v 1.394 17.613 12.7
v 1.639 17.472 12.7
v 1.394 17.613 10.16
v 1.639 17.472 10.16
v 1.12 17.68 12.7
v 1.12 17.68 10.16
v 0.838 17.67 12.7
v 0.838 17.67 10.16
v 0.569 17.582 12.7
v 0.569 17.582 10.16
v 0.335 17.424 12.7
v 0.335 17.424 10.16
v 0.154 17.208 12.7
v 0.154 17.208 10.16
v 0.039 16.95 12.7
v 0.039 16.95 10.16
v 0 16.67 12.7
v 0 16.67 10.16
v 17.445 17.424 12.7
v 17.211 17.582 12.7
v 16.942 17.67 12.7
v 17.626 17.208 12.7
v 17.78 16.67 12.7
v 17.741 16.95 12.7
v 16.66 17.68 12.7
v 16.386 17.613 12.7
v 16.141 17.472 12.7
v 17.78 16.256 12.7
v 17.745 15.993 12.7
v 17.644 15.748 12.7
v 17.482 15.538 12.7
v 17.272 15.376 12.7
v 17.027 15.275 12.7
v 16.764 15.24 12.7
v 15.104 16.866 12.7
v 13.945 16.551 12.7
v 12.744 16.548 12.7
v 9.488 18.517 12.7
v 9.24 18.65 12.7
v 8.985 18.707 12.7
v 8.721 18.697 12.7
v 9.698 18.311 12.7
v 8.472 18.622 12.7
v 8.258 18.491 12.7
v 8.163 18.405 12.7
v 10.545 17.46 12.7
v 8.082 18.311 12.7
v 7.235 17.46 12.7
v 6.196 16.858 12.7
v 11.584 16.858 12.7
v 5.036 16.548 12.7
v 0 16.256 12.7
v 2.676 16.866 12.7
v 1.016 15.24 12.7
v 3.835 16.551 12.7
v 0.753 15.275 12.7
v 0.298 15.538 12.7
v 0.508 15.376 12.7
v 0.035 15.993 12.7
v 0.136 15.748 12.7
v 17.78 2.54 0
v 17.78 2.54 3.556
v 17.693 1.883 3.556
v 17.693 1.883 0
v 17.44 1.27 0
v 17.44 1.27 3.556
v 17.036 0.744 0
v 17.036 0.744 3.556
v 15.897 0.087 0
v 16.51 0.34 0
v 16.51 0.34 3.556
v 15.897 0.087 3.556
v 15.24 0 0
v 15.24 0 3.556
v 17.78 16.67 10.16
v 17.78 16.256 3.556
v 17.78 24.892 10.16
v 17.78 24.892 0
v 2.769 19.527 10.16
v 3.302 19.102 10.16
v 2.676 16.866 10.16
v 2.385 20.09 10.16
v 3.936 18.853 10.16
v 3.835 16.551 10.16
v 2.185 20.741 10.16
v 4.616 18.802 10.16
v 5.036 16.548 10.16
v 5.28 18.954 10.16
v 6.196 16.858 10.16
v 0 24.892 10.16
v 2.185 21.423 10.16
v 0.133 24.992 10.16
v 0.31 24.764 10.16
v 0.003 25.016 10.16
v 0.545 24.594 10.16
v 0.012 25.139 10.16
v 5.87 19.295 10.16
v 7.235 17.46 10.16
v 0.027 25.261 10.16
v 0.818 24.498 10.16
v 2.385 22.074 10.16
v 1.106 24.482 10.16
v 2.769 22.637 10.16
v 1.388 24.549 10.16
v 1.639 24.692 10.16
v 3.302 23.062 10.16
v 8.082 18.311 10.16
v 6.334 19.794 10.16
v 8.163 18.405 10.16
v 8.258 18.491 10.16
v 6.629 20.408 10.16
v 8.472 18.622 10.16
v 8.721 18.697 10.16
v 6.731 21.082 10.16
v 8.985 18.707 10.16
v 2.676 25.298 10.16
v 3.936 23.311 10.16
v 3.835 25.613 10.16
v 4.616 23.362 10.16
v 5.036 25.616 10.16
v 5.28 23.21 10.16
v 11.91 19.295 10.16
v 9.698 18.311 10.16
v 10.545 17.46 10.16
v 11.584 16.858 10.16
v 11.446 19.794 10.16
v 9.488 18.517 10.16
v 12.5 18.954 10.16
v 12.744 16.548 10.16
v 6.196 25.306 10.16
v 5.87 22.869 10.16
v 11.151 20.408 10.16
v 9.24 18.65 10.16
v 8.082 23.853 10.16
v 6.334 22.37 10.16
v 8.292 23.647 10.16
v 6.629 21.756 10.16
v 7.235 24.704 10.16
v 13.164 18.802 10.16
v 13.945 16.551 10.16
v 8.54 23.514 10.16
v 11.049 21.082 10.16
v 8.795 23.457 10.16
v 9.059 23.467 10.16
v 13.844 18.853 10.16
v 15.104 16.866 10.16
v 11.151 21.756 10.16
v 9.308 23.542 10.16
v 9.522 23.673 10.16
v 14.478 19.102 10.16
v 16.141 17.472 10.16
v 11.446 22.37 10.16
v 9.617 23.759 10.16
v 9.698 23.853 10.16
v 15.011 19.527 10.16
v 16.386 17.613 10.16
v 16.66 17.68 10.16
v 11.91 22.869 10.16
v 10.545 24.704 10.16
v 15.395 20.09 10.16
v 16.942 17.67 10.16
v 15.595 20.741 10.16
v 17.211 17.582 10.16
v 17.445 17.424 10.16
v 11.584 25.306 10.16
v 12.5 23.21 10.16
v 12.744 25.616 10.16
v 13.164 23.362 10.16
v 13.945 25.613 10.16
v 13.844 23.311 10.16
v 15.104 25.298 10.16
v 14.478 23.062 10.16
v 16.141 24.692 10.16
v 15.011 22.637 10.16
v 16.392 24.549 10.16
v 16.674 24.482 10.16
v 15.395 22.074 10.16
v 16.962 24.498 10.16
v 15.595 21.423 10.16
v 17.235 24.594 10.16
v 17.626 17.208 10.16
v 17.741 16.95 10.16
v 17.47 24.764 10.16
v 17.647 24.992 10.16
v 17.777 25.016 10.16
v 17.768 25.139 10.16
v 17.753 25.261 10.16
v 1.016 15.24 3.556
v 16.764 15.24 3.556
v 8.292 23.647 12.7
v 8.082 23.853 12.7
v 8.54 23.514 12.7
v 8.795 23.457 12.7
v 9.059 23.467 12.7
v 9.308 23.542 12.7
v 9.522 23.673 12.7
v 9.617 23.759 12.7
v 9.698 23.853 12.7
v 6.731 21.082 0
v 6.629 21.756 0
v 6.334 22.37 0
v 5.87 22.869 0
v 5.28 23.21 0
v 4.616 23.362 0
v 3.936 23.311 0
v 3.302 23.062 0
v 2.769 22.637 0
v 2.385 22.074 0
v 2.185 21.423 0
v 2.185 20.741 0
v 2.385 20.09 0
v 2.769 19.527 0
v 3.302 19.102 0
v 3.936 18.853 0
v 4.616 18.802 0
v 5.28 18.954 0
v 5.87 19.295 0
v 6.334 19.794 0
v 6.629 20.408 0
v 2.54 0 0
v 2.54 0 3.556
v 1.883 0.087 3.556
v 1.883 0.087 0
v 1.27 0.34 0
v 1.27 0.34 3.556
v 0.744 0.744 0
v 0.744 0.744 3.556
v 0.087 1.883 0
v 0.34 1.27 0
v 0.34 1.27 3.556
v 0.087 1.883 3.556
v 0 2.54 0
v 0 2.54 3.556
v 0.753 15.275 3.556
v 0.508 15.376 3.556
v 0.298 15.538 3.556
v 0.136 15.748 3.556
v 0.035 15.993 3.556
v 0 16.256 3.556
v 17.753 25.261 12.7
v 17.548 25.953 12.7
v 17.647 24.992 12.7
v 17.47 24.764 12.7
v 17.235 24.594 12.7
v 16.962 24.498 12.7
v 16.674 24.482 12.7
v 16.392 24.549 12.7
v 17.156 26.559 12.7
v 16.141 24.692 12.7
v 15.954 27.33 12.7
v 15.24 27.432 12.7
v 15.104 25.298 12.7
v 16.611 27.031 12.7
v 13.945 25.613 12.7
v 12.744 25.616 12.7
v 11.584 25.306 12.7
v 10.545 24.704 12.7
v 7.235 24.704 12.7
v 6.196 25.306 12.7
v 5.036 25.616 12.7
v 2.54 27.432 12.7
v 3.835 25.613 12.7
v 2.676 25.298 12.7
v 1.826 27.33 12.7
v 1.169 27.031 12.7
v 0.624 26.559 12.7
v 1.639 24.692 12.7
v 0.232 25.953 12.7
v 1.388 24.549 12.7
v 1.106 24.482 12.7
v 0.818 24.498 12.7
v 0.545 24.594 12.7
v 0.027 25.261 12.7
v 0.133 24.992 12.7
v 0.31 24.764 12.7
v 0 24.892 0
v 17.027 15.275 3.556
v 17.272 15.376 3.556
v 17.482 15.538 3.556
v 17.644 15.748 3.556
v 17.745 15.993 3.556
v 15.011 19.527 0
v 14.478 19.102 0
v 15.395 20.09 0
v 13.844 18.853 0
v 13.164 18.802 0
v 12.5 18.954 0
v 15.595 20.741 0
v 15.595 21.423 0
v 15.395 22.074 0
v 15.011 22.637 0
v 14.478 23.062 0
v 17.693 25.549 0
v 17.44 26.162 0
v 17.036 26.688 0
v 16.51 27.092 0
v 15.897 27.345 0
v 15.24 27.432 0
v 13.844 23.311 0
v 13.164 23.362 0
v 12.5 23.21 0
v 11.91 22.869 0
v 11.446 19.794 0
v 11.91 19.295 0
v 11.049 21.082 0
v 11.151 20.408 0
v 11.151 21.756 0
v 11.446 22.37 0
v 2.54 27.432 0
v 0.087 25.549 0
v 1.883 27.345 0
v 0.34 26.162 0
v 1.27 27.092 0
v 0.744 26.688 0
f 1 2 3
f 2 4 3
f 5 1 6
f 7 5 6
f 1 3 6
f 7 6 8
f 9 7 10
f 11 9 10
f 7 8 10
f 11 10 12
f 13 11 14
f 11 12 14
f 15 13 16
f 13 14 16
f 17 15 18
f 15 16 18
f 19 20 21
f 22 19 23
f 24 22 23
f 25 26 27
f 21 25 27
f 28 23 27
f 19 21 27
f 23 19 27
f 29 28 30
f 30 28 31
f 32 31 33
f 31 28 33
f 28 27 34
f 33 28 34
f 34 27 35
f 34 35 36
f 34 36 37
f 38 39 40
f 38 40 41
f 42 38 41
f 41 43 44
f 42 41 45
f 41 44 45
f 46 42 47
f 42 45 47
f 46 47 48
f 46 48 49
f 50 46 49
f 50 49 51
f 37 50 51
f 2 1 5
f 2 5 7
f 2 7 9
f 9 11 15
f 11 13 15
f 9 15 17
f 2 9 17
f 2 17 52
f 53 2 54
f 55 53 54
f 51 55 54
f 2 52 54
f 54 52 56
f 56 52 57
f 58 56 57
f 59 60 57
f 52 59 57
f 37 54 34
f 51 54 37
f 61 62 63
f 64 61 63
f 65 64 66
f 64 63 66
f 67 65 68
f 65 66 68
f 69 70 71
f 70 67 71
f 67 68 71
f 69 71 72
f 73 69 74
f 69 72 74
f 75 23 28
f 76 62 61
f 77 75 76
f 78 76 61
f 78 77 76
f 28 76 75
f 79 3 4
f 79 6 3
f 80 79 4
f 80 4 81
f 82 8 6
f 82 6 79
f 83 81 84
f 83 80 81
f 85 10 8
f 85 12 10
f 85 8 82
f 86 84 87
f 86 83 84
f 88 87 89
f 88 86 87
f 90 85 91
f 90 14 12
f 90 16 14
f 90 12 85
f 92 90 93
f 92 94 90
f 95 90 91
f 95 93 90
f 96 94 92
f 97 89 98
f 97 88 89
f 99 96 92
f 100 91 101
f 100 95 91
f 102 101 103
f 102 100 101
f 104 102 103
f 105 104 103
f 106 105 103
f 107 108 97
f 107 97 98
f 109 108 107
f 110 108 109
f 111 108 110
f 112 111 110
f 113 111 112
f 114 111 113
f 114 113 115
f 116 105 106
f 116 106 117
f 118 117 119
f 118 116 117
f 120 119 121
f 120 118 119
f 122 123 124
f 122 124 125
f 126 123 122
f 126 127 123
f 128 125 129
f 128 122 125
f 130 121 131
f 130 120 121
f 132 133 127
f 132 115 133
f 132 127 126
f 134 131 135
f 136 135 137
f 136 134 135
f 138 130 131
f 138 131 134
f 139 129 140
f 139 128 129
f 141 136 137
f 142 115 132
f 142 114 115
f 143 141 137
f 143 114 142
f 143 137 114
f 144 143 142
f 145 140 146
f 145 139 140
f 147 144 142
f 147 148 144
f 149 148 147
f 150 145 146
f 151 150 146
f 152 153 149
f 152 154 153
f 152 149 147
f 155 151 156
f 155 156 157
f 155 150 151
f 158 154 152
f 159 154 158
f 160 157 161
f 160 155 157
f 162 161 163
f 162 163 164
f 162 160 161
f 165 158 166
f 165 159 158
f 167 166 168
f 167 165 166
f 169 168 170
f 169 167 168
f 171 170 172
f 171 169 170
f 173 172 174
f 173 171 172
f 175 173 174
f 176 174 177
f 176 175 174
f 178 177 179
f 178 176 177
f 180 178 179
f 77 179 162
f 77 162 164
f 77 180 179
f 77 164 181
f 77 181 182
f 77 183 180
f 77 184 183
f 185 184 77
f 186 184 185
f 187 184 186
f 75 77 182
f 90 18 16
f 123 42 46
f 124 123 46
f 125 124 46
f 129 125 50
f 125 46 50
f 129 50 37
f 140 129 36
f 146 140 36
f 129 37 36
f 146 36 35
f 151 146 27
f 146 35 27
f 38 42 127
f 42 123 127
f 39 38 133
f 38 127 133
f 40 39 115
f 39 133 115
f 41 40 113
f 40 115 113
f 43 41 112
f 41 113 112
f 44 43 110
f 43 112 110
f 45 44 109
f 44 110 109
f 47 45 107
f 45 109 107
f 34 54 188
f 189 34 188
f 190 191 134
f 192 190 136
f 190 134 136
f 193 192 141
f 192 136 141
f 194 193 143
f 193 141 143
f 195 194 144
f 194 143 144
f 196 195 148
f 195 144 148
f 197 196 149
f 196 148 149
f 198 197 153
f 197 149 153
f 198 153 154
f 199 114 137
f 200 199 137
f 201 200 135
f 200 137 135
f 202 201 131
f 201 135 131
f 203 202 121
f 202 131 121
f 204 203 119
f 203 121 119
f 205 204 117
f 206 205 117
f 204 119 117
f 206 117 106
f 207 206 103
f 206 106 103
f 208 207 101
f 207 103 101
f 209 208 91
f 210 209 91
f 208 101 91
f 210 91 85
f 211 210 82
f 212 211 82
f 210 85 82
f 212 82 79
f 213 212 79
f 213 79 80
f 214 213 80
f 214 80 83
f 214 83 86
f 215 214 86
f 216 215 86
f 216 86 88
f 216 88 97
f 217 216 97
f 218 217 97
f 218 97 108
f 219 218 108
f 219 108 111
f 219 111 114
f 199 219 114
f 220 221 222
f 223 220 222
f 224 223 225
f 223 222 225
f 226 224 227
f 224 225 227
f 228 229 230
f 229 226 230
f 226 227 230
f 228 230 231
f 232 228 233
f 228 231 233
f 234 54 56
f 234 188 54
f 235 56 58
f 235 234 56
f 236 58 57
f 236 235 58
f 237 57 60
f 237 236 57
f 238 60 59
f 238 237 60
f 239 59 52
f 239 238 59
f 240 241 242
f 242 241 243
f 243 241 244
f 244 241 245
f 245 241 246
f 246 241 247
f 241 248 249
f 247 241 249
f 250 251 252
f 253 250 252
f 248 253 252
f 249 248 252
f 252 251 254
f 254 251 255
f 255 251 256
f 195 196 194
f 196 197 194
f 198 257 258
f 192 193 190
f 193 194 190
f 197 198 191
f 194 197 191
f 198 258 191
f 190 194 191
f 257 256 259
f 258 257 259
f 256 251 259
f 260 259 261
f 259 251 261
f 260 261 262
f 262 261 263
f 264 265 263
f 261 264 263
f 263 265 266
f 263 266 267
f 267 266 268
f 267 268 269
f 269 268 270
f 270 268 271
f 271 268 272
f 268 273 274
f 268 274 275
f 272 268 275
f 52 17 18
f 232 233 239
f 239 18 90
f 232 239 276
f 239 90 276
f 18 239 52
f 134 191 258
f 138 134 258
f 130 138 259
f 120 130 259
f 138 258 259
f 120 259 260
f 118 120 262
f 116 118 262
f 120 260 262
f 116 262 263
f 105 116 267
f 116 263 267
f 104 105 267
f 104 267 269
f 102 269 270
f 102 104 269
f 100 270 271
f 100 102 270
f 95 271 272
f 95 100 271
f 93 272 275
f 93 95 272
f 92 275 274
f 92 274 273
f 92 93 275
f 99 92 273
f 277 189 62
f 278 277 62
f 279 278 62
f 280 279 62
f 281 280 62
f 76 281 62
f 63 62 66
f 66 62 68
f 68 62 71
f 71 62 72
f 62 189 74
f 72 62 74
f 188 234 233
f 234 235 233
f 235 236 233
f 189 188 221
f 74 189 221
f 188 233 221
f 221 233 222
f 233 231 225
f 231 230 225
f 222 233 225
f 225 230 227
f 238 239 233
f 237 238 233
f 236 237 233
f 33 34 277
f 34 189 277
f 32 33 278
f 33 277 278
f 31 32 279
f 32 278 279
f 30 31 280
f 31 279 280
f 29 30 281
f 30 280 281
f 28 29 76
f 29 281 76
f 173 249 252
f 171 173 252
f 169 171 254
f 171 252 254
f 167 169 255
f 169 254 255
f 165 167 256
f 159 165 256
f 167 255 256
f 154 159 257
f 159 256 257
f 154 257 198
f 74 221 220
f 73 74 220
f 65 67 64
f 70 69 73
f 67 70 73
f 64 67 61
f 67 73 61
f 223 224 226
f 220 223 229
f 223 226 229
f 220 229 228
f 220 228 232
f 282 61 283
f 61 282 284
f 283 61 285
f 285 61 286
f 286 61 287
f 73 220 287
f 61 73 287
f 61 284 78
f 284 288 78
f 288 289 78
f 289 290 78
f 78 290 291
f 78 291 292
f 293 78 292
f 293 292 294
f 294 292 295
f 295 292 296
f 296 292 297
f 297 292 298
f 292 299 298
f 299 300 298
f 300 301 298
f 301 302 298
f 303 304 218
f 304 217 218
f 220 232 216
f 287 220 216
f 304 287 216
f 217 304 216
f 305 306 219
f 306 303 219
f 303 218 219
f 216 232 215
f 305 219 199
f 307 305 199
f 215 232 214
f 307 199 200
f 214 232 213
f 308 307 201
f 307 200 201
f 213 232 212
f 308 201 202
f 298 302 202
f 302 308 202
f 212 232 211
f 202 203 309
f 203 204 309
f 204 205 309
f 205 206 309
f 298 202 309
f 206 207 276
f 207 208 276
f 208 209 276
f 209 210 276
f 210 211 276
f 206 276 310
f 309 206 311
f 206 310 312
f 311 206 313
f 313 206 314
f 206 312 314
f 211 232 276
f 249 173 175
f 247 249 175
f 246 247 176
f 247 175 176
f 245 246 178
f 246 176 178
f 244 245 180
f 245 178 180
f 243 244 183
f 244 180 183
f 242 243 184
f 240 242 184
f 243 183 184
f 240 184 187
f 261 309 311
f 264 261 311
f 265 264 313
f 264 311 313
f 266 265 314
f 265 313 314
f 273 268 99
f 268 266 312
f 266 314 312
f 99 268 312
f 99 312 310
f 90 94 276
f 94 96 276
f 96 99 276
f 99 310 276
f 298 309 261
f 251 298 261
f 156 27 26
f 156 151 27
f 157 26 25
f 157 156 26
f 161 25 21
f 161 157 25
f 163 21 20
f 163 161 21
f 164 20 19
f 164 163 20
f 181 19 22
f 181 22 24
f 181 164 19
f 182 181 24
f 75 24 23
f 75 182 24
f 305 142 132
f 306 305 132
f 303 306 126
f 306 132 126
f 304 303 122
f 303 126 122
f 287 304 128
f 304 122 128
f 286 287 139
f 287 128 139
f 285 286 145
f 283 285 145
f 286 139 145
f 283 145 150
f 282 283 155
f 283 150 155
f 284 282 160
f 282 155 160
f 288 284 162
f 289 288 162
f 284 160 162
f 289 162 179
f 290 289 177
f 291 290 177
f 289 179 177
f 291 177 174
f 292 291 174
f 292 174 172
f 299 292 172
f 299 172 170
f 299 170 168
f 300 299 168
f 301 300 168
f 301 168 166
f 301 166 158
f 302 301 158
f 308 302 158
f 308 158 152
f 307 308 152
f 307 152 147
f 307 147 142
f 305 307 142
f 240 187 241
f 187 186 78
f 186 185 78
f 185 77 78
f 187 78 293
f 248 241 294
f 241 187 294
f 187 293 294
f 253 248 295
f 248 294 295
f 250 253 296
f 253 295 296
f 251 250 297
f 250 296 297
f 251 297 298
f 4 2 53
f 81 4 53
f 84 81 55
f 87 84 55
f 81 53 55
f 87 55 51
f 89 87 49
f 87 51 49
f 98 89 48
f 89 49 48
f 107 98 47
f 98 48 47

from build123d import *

# Parameters (mm, degrees)
BOSS_EXTRUDE1_DEPTH = 17.78
SKETCH2_R           = 2.286
CUT_EXTRUDE1_DEPTH  = 36.070400967
SKETCH3_R           = 2.286
SKETCH3_R_2         = 4.572
CUT_EXTRUDE2_DEPTH  = 2.54
FILLET1_R           = 1.016
FILLET2_R           = 2.54


with BuildPart() as part:
    # Sketch1 → Boss-Extrude1 (new body)
    with BuildSketch(Plane(origin=(0, 0, 0), x_dir=(0, 0, -1), z_dir=(1, 0, 0))):
        Polygon((0, 0), (0, 27.432), (-12.7, 27.432), (-12.7, 15.24), (-3.556, 15.24), (-3.556, 0), align=None)
    extrude(amount=BOSS_EXTRUDE1_DEPTH)

    # Sketch2 → Cut-Extrude1 (cut, through all)
    with BuildSketch(Plane.XY.offset(12.7)):
        with Locations((4.445, 21.082)):
            Circle(SKETCH2_R)
        with Locations(Location((13.335, 21.082, 0), (0, 0, 180))):
            Circle(SKETCH2_R)
    extrude(amount=-CUT_EXTRUDE1_DEPTH, mode=Mode.SUBTRACT)

    # Sketch3 → Cut-Extrude2 (cut)
    # profile 1 of 4: a face of its own
    with BuildSketch(Plane.XY.offset(12.7)):
        with BuildLine():
            ThreePointArc((8.89, 20.011878979), (8.763, 21.082), (8.89, 22.152121021))
            ThreePointArc((8.89, 22.152121021), (4.445, 25.654), (0, 22.152121021))
            Line((0, 22.152121021), (0, 20.011878979))
            ThreePointArc((0, 20.011878979), (4.445, 16.51), (8.89, 20.011878979))
        make_face()
        with Locations((4.445, 21.082)):
            Circle(SKETCH3_R, mode=Mode.SUBTRACT)
    # profile 2 of 4: a face of its own
    with BuildSketch(Plane.XY.offset(12.7)):
        with BuildLine():
            ThreePointArc((8.89, 22.152121021), (8.985138985, 21.620815367), (9.017, 21.082))
            ThreePointArc((9.017, 21.082), (8.985138985, 20.543184633), (8.89, 20.011878979))
            ThreePointArc((8.89, 20.011878979), (13.335, 16.51), (17.78, 20.011878979))
            Line((17.78, 20.011878979), (17.78, 22.152121021))
            ThreePointArc((17.78, 22.152121021), (13.335, 25.654), (8.89, 22.152121021))
        make_face()
        with Locations((13.335, 21.082)):
            Circle(SKETCH3_R, mode=Mode.SUBTRACT)
    # profile 3 of 4: a face of its own
    with BuildSketch(Plane.XY.offset(12.7)):
        with Locations((4.445, 21.082)):
            Circle(SKETCH3_R_2)
    # profile 4 of 4: a face of its own
    with BuildSketch(Plane.XY.offset(12.7)):
        with Locations((13.335, 21.082)):
            Circle(SKETCH3_R_2)
    extrude(amount=-CUT_EXTRUDE2_DEPTH, mode=Mode.SUBTRACT)

    # Fillet1
    fillet1_edges = [part.edges().sort_by_distance(p)[0] for p in [
        (17.78, 15.24, 8.128),
        (8.89, 20.011878979, 11.43),
        (0, 20.011878979, 11.43),
        (0, 22.152121021, 11.43),
        (8.89, 22.152121021, 11.43),
        (17.78, 22.152121021, 11.43),
        (17.78, 20.011878979, 11.43),
        (0, 15.24, 8.128),
    ]]
    fillet(fillet1_edges, radius=FILLET1_R)

    # Fillet2
    # the kernel refuses this fillet: 2.54 mm, written as the material it takes off along each edge
    with BuildSketch(Plane(origin=(0, 27.432, -6.35), x_dir=(0, -1, 0), z_dir=(0, 0, 1))) as fillet2_piece_1:
        with BuildLine():
            CenterArc((FILLET2_R, FILLET2_R), FILLET2_R, 180, 90)
            Line((0, FILLET2_R), (-FILLET2_R * 0.02, FILLET2_R))
            Line((-FILLET2_R * 0.02, FILLET2_R), (-FILLET2_R * 0.02, -FILLET2_R * 0.02))
            Line((-FILLET2_R * 0.02, -FILLET2_R * 0.02), (FILLET2_R, -FILLET2_R * 0.02))
            Line((FILLET2_R, -FILLET2_R * 0.02), (FILLET2_R, 0))
        make_face()
    extrude(amount=25.4, mode=Mode.SUBTRACT)
    with BuildSketch(Plane(origin=(17.78, 27.432, -6.35), x_dir=(0, -1, 0), z_dir=(0, 0, 1))) as fillet2_piece_2:
        with BuildLine():
            CenterArc((FILLET2_R, -FILLET2_R), FILLET2_R, 90, 90)
            Line((0, -FILLET2_R), (-FILLET2_R * 0.02, -FILLET2_R))
            Line((-FILLET2_R * 0.02, -FILLET2_R), (-FILLET2_R * 0.02, FILLET2_R * 0.02))
            Line((-FILLET2_R * 0.02, FILLET2_R * 0.02), (FILLET2_R, FILLET2_R * 0.02))
            Line((FILLET2_R, FILLET2_R * 0.02), (FILLET2_R, 0))
        make_face()
    extrude(amount=25.4, mode=Mode.SUBTRACT)
    with BuildSketch(Plane(origin=(0, 0, 9.906), x_dir=(0, 1, 0), z_dir=(0, 0, -1))) as fillet2_piece_3:
        with BuildLine():
            CenterArc((FILLET2_R, FILLET2_R), FILLET2_R, 180, 90)
            Line((0, FILLET2_R), (-FILLET2_R * 0.02, FILLET2_R))
            Line((-FILLET2_R * 0.02, FILLET2_R), (-FILLET2_R * 0.02, -FILLET2_R * 0.02))
            Line((-FILLET2_R * 0.02, -FILLET2_R * 0.02), (FILLET2_R, -FILLET2_R * 0.02))
            Line((FILLET2_R, -FILLET2_R * 0.02), (FILLET2_R, 0))
        make_face()
    extrude(amount=16.256, mode=Mode.SUBTRACT)
    with BuildSketch(Plane(origin=(17.78, 0, 9.906), x_dir=(0, 1, 0), z_dir=(0, 0, -1))) as fillet2_piece_4:
        with BuildLine():
            CenterArc((FILLET2_R, -FILLET2_R), FILLET2_R, 90, 90)
            Line((0, -FILLET2_R), (-FILLET2_R * 0.02, -FILLET2_R))
            Line((-FILLET2_R * 0.02, -FILLET2_R), (-FILLET2_R * 0.02, FILLET2_R * 0.02))
            Line((-FILLET2_R * 0.02, FILLET2_R * 0.02), (FILLET2_R, FILLET2_R * 0.02))
            Line((FILLET2_R, FILLET2_R * 0.02), (FILLET2_R, 0))
        make_face()
    extrude(amount=16.256, mode=Mode.SUBTRACT)


solid = part.part
